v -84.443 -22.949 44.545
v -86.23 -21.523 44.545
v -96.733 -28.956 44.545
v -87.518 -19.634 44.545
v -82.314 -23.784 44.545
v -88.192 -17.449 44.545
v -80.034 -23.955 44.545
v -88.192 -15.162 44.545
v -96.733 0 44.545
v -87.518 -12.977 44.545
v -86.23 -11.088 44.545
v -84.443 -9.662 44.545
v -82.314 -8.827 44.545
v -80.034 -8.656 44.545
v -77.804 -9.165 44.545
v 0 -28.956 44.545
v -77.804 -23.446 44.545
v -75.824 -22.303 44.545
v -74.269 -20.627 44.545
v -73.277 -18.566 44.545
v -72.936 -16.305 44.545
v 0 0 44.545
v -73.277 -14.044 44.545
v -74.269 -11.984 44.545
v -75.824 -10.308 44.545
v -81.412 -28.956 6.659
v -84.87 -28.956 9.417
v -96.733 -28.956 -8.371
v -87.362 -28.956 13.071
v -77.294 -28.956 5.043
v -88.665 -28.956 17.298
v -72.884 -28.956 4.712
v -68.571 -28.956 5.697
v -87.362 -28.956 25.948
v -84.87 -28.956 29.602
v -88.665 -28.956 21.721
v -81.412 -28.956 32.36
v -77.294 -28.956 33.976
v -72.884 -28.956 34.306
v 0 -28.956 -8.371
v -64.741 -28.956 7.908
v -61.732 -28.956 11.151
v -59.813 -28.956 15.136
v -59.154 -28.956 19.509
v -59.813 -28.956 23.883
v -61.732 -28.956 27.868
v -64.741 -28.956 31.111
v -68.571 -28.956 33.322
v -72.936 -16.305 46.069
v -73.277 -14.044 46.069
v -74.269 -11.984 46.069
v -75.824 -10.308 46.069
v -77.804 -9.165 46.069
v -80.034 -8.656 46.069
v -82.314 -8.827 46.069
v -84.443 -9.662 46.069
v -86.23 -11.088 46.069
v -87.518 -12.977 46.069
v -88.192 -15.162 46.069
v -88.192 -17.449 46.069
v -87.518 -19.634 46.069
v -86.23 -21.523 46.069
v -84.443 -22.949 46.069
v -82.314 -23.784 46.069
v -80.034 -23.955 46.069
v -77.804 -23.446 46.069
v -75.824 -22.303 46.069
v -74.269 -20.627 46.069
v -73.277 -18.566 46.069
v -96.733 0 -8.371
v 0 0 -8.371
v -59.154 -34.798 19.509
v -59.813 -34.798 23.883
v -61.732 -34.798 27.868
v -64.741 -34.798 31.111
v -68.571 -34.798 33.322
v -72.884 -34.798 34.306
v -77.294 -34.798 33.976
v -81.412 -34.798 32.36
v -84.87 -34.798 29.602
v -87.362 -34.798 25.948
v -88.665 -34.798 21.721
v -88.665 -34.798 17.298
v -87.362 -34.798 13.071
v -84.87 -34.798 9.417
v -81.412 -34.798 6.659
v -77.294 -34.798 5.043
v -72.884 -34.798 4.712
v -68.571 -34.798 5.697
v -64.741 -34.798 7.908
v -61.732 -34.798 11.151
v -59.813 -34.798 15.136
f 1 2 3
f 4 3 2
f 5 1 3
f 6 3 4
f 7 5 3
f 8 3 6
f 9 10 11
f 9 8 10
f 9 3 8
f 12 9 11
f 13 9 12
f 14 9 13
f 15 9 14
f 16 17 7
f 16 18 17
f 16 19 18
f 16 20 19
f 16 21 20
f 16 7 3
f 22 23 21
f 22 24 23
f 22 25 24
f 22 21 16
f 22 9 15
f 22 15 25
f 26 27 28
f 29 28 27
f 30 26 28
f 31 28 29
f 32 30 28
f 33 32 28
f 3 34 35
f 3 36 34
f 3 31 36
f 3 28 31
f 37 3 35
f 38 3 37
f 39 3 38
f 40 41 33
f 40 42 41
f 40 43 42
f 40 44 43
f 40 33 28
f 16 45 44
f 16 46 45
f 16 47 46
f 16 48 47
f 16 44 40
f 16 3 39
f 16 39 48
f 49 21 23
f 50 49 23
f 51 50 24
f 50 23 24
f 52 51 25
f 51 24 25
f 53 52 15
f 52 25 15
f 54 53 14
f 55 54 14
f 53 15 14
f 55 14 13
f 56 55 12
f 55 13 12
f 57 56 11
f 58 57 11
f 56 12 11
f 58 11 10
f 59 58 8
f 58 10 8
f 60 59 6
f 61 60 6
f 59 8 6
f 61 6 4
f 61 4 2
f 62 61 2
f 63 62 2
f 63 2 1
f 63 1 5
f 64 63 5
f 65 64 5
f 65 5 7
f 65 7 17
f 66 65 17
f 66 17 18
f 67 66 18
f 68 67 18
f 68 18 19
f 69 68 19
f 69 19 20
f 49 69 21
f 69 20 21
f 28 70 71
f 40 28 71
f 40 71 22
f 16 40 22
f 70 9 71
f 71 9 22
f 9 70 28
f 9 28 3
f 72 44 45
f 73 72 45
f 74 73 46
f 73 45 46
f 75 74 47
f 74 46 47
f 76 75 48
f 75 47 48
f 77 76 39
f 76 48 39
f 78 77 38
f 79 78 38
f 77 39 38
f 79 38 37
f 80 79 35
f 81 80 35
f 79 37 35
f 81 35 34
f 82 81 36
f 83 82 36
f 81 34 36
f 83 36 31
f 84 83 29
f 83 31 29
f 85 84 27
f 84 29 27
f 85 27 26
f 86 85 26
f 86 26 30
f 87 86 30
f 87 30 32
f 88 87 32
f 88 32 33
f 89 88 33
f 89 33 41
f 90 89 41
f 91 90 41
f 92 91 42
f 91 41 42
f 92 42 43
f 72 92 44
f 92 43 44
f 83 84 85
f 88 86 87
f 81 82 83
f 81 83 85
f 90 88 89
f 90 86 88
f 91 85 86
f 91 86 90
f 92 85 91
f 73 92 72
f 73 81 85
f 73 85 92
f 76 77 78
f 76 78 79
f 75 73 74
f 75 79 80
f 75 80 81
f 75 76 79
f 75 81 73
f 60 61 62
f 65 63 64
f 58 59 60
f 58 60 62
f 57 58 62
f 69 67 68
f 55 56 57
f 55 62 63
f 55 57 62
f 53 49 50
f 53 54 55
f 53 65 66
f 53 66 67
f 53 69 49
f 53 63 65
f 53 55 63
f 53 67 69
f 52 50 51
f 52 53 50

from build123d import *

# Parameters (mm, degrees)
F0_W     = 96.733004
F0_H     = 52.915374
F1_DEPTH = 28.956
F2_R     = 14.838467
F3_DEPTH = 5.842
F4_R     = 7.671079
F5_DEPTH = 1.524


with BuildPart() as f1:
    # F0 (on Front) → F1 (new body)
    with BuildSketch(Plane.XZ):
        with Locations((-48.366502, 18.087014)):
            Rectangle(F0_W, F0_H)
    extrude(amount=F1_DEPTH)

    # F2 (on face) → F3 (join)
    with BuildSketch(Plane.XZ.offset(28.956)):
        with Locations((-73.99255, 19.509472)):
            Circle(F2_R)
    extrude(amount=F3_DEPTH)

    # F4 (on face) → F5 (join)
    with BuildSketch(Plane.XY.offset(44.544701)):
        with Locations((-80.607049, -16.305355)):
            Circle(F4_R)
    extrude(amount=F5_DEPTH)


solid = f1.part
